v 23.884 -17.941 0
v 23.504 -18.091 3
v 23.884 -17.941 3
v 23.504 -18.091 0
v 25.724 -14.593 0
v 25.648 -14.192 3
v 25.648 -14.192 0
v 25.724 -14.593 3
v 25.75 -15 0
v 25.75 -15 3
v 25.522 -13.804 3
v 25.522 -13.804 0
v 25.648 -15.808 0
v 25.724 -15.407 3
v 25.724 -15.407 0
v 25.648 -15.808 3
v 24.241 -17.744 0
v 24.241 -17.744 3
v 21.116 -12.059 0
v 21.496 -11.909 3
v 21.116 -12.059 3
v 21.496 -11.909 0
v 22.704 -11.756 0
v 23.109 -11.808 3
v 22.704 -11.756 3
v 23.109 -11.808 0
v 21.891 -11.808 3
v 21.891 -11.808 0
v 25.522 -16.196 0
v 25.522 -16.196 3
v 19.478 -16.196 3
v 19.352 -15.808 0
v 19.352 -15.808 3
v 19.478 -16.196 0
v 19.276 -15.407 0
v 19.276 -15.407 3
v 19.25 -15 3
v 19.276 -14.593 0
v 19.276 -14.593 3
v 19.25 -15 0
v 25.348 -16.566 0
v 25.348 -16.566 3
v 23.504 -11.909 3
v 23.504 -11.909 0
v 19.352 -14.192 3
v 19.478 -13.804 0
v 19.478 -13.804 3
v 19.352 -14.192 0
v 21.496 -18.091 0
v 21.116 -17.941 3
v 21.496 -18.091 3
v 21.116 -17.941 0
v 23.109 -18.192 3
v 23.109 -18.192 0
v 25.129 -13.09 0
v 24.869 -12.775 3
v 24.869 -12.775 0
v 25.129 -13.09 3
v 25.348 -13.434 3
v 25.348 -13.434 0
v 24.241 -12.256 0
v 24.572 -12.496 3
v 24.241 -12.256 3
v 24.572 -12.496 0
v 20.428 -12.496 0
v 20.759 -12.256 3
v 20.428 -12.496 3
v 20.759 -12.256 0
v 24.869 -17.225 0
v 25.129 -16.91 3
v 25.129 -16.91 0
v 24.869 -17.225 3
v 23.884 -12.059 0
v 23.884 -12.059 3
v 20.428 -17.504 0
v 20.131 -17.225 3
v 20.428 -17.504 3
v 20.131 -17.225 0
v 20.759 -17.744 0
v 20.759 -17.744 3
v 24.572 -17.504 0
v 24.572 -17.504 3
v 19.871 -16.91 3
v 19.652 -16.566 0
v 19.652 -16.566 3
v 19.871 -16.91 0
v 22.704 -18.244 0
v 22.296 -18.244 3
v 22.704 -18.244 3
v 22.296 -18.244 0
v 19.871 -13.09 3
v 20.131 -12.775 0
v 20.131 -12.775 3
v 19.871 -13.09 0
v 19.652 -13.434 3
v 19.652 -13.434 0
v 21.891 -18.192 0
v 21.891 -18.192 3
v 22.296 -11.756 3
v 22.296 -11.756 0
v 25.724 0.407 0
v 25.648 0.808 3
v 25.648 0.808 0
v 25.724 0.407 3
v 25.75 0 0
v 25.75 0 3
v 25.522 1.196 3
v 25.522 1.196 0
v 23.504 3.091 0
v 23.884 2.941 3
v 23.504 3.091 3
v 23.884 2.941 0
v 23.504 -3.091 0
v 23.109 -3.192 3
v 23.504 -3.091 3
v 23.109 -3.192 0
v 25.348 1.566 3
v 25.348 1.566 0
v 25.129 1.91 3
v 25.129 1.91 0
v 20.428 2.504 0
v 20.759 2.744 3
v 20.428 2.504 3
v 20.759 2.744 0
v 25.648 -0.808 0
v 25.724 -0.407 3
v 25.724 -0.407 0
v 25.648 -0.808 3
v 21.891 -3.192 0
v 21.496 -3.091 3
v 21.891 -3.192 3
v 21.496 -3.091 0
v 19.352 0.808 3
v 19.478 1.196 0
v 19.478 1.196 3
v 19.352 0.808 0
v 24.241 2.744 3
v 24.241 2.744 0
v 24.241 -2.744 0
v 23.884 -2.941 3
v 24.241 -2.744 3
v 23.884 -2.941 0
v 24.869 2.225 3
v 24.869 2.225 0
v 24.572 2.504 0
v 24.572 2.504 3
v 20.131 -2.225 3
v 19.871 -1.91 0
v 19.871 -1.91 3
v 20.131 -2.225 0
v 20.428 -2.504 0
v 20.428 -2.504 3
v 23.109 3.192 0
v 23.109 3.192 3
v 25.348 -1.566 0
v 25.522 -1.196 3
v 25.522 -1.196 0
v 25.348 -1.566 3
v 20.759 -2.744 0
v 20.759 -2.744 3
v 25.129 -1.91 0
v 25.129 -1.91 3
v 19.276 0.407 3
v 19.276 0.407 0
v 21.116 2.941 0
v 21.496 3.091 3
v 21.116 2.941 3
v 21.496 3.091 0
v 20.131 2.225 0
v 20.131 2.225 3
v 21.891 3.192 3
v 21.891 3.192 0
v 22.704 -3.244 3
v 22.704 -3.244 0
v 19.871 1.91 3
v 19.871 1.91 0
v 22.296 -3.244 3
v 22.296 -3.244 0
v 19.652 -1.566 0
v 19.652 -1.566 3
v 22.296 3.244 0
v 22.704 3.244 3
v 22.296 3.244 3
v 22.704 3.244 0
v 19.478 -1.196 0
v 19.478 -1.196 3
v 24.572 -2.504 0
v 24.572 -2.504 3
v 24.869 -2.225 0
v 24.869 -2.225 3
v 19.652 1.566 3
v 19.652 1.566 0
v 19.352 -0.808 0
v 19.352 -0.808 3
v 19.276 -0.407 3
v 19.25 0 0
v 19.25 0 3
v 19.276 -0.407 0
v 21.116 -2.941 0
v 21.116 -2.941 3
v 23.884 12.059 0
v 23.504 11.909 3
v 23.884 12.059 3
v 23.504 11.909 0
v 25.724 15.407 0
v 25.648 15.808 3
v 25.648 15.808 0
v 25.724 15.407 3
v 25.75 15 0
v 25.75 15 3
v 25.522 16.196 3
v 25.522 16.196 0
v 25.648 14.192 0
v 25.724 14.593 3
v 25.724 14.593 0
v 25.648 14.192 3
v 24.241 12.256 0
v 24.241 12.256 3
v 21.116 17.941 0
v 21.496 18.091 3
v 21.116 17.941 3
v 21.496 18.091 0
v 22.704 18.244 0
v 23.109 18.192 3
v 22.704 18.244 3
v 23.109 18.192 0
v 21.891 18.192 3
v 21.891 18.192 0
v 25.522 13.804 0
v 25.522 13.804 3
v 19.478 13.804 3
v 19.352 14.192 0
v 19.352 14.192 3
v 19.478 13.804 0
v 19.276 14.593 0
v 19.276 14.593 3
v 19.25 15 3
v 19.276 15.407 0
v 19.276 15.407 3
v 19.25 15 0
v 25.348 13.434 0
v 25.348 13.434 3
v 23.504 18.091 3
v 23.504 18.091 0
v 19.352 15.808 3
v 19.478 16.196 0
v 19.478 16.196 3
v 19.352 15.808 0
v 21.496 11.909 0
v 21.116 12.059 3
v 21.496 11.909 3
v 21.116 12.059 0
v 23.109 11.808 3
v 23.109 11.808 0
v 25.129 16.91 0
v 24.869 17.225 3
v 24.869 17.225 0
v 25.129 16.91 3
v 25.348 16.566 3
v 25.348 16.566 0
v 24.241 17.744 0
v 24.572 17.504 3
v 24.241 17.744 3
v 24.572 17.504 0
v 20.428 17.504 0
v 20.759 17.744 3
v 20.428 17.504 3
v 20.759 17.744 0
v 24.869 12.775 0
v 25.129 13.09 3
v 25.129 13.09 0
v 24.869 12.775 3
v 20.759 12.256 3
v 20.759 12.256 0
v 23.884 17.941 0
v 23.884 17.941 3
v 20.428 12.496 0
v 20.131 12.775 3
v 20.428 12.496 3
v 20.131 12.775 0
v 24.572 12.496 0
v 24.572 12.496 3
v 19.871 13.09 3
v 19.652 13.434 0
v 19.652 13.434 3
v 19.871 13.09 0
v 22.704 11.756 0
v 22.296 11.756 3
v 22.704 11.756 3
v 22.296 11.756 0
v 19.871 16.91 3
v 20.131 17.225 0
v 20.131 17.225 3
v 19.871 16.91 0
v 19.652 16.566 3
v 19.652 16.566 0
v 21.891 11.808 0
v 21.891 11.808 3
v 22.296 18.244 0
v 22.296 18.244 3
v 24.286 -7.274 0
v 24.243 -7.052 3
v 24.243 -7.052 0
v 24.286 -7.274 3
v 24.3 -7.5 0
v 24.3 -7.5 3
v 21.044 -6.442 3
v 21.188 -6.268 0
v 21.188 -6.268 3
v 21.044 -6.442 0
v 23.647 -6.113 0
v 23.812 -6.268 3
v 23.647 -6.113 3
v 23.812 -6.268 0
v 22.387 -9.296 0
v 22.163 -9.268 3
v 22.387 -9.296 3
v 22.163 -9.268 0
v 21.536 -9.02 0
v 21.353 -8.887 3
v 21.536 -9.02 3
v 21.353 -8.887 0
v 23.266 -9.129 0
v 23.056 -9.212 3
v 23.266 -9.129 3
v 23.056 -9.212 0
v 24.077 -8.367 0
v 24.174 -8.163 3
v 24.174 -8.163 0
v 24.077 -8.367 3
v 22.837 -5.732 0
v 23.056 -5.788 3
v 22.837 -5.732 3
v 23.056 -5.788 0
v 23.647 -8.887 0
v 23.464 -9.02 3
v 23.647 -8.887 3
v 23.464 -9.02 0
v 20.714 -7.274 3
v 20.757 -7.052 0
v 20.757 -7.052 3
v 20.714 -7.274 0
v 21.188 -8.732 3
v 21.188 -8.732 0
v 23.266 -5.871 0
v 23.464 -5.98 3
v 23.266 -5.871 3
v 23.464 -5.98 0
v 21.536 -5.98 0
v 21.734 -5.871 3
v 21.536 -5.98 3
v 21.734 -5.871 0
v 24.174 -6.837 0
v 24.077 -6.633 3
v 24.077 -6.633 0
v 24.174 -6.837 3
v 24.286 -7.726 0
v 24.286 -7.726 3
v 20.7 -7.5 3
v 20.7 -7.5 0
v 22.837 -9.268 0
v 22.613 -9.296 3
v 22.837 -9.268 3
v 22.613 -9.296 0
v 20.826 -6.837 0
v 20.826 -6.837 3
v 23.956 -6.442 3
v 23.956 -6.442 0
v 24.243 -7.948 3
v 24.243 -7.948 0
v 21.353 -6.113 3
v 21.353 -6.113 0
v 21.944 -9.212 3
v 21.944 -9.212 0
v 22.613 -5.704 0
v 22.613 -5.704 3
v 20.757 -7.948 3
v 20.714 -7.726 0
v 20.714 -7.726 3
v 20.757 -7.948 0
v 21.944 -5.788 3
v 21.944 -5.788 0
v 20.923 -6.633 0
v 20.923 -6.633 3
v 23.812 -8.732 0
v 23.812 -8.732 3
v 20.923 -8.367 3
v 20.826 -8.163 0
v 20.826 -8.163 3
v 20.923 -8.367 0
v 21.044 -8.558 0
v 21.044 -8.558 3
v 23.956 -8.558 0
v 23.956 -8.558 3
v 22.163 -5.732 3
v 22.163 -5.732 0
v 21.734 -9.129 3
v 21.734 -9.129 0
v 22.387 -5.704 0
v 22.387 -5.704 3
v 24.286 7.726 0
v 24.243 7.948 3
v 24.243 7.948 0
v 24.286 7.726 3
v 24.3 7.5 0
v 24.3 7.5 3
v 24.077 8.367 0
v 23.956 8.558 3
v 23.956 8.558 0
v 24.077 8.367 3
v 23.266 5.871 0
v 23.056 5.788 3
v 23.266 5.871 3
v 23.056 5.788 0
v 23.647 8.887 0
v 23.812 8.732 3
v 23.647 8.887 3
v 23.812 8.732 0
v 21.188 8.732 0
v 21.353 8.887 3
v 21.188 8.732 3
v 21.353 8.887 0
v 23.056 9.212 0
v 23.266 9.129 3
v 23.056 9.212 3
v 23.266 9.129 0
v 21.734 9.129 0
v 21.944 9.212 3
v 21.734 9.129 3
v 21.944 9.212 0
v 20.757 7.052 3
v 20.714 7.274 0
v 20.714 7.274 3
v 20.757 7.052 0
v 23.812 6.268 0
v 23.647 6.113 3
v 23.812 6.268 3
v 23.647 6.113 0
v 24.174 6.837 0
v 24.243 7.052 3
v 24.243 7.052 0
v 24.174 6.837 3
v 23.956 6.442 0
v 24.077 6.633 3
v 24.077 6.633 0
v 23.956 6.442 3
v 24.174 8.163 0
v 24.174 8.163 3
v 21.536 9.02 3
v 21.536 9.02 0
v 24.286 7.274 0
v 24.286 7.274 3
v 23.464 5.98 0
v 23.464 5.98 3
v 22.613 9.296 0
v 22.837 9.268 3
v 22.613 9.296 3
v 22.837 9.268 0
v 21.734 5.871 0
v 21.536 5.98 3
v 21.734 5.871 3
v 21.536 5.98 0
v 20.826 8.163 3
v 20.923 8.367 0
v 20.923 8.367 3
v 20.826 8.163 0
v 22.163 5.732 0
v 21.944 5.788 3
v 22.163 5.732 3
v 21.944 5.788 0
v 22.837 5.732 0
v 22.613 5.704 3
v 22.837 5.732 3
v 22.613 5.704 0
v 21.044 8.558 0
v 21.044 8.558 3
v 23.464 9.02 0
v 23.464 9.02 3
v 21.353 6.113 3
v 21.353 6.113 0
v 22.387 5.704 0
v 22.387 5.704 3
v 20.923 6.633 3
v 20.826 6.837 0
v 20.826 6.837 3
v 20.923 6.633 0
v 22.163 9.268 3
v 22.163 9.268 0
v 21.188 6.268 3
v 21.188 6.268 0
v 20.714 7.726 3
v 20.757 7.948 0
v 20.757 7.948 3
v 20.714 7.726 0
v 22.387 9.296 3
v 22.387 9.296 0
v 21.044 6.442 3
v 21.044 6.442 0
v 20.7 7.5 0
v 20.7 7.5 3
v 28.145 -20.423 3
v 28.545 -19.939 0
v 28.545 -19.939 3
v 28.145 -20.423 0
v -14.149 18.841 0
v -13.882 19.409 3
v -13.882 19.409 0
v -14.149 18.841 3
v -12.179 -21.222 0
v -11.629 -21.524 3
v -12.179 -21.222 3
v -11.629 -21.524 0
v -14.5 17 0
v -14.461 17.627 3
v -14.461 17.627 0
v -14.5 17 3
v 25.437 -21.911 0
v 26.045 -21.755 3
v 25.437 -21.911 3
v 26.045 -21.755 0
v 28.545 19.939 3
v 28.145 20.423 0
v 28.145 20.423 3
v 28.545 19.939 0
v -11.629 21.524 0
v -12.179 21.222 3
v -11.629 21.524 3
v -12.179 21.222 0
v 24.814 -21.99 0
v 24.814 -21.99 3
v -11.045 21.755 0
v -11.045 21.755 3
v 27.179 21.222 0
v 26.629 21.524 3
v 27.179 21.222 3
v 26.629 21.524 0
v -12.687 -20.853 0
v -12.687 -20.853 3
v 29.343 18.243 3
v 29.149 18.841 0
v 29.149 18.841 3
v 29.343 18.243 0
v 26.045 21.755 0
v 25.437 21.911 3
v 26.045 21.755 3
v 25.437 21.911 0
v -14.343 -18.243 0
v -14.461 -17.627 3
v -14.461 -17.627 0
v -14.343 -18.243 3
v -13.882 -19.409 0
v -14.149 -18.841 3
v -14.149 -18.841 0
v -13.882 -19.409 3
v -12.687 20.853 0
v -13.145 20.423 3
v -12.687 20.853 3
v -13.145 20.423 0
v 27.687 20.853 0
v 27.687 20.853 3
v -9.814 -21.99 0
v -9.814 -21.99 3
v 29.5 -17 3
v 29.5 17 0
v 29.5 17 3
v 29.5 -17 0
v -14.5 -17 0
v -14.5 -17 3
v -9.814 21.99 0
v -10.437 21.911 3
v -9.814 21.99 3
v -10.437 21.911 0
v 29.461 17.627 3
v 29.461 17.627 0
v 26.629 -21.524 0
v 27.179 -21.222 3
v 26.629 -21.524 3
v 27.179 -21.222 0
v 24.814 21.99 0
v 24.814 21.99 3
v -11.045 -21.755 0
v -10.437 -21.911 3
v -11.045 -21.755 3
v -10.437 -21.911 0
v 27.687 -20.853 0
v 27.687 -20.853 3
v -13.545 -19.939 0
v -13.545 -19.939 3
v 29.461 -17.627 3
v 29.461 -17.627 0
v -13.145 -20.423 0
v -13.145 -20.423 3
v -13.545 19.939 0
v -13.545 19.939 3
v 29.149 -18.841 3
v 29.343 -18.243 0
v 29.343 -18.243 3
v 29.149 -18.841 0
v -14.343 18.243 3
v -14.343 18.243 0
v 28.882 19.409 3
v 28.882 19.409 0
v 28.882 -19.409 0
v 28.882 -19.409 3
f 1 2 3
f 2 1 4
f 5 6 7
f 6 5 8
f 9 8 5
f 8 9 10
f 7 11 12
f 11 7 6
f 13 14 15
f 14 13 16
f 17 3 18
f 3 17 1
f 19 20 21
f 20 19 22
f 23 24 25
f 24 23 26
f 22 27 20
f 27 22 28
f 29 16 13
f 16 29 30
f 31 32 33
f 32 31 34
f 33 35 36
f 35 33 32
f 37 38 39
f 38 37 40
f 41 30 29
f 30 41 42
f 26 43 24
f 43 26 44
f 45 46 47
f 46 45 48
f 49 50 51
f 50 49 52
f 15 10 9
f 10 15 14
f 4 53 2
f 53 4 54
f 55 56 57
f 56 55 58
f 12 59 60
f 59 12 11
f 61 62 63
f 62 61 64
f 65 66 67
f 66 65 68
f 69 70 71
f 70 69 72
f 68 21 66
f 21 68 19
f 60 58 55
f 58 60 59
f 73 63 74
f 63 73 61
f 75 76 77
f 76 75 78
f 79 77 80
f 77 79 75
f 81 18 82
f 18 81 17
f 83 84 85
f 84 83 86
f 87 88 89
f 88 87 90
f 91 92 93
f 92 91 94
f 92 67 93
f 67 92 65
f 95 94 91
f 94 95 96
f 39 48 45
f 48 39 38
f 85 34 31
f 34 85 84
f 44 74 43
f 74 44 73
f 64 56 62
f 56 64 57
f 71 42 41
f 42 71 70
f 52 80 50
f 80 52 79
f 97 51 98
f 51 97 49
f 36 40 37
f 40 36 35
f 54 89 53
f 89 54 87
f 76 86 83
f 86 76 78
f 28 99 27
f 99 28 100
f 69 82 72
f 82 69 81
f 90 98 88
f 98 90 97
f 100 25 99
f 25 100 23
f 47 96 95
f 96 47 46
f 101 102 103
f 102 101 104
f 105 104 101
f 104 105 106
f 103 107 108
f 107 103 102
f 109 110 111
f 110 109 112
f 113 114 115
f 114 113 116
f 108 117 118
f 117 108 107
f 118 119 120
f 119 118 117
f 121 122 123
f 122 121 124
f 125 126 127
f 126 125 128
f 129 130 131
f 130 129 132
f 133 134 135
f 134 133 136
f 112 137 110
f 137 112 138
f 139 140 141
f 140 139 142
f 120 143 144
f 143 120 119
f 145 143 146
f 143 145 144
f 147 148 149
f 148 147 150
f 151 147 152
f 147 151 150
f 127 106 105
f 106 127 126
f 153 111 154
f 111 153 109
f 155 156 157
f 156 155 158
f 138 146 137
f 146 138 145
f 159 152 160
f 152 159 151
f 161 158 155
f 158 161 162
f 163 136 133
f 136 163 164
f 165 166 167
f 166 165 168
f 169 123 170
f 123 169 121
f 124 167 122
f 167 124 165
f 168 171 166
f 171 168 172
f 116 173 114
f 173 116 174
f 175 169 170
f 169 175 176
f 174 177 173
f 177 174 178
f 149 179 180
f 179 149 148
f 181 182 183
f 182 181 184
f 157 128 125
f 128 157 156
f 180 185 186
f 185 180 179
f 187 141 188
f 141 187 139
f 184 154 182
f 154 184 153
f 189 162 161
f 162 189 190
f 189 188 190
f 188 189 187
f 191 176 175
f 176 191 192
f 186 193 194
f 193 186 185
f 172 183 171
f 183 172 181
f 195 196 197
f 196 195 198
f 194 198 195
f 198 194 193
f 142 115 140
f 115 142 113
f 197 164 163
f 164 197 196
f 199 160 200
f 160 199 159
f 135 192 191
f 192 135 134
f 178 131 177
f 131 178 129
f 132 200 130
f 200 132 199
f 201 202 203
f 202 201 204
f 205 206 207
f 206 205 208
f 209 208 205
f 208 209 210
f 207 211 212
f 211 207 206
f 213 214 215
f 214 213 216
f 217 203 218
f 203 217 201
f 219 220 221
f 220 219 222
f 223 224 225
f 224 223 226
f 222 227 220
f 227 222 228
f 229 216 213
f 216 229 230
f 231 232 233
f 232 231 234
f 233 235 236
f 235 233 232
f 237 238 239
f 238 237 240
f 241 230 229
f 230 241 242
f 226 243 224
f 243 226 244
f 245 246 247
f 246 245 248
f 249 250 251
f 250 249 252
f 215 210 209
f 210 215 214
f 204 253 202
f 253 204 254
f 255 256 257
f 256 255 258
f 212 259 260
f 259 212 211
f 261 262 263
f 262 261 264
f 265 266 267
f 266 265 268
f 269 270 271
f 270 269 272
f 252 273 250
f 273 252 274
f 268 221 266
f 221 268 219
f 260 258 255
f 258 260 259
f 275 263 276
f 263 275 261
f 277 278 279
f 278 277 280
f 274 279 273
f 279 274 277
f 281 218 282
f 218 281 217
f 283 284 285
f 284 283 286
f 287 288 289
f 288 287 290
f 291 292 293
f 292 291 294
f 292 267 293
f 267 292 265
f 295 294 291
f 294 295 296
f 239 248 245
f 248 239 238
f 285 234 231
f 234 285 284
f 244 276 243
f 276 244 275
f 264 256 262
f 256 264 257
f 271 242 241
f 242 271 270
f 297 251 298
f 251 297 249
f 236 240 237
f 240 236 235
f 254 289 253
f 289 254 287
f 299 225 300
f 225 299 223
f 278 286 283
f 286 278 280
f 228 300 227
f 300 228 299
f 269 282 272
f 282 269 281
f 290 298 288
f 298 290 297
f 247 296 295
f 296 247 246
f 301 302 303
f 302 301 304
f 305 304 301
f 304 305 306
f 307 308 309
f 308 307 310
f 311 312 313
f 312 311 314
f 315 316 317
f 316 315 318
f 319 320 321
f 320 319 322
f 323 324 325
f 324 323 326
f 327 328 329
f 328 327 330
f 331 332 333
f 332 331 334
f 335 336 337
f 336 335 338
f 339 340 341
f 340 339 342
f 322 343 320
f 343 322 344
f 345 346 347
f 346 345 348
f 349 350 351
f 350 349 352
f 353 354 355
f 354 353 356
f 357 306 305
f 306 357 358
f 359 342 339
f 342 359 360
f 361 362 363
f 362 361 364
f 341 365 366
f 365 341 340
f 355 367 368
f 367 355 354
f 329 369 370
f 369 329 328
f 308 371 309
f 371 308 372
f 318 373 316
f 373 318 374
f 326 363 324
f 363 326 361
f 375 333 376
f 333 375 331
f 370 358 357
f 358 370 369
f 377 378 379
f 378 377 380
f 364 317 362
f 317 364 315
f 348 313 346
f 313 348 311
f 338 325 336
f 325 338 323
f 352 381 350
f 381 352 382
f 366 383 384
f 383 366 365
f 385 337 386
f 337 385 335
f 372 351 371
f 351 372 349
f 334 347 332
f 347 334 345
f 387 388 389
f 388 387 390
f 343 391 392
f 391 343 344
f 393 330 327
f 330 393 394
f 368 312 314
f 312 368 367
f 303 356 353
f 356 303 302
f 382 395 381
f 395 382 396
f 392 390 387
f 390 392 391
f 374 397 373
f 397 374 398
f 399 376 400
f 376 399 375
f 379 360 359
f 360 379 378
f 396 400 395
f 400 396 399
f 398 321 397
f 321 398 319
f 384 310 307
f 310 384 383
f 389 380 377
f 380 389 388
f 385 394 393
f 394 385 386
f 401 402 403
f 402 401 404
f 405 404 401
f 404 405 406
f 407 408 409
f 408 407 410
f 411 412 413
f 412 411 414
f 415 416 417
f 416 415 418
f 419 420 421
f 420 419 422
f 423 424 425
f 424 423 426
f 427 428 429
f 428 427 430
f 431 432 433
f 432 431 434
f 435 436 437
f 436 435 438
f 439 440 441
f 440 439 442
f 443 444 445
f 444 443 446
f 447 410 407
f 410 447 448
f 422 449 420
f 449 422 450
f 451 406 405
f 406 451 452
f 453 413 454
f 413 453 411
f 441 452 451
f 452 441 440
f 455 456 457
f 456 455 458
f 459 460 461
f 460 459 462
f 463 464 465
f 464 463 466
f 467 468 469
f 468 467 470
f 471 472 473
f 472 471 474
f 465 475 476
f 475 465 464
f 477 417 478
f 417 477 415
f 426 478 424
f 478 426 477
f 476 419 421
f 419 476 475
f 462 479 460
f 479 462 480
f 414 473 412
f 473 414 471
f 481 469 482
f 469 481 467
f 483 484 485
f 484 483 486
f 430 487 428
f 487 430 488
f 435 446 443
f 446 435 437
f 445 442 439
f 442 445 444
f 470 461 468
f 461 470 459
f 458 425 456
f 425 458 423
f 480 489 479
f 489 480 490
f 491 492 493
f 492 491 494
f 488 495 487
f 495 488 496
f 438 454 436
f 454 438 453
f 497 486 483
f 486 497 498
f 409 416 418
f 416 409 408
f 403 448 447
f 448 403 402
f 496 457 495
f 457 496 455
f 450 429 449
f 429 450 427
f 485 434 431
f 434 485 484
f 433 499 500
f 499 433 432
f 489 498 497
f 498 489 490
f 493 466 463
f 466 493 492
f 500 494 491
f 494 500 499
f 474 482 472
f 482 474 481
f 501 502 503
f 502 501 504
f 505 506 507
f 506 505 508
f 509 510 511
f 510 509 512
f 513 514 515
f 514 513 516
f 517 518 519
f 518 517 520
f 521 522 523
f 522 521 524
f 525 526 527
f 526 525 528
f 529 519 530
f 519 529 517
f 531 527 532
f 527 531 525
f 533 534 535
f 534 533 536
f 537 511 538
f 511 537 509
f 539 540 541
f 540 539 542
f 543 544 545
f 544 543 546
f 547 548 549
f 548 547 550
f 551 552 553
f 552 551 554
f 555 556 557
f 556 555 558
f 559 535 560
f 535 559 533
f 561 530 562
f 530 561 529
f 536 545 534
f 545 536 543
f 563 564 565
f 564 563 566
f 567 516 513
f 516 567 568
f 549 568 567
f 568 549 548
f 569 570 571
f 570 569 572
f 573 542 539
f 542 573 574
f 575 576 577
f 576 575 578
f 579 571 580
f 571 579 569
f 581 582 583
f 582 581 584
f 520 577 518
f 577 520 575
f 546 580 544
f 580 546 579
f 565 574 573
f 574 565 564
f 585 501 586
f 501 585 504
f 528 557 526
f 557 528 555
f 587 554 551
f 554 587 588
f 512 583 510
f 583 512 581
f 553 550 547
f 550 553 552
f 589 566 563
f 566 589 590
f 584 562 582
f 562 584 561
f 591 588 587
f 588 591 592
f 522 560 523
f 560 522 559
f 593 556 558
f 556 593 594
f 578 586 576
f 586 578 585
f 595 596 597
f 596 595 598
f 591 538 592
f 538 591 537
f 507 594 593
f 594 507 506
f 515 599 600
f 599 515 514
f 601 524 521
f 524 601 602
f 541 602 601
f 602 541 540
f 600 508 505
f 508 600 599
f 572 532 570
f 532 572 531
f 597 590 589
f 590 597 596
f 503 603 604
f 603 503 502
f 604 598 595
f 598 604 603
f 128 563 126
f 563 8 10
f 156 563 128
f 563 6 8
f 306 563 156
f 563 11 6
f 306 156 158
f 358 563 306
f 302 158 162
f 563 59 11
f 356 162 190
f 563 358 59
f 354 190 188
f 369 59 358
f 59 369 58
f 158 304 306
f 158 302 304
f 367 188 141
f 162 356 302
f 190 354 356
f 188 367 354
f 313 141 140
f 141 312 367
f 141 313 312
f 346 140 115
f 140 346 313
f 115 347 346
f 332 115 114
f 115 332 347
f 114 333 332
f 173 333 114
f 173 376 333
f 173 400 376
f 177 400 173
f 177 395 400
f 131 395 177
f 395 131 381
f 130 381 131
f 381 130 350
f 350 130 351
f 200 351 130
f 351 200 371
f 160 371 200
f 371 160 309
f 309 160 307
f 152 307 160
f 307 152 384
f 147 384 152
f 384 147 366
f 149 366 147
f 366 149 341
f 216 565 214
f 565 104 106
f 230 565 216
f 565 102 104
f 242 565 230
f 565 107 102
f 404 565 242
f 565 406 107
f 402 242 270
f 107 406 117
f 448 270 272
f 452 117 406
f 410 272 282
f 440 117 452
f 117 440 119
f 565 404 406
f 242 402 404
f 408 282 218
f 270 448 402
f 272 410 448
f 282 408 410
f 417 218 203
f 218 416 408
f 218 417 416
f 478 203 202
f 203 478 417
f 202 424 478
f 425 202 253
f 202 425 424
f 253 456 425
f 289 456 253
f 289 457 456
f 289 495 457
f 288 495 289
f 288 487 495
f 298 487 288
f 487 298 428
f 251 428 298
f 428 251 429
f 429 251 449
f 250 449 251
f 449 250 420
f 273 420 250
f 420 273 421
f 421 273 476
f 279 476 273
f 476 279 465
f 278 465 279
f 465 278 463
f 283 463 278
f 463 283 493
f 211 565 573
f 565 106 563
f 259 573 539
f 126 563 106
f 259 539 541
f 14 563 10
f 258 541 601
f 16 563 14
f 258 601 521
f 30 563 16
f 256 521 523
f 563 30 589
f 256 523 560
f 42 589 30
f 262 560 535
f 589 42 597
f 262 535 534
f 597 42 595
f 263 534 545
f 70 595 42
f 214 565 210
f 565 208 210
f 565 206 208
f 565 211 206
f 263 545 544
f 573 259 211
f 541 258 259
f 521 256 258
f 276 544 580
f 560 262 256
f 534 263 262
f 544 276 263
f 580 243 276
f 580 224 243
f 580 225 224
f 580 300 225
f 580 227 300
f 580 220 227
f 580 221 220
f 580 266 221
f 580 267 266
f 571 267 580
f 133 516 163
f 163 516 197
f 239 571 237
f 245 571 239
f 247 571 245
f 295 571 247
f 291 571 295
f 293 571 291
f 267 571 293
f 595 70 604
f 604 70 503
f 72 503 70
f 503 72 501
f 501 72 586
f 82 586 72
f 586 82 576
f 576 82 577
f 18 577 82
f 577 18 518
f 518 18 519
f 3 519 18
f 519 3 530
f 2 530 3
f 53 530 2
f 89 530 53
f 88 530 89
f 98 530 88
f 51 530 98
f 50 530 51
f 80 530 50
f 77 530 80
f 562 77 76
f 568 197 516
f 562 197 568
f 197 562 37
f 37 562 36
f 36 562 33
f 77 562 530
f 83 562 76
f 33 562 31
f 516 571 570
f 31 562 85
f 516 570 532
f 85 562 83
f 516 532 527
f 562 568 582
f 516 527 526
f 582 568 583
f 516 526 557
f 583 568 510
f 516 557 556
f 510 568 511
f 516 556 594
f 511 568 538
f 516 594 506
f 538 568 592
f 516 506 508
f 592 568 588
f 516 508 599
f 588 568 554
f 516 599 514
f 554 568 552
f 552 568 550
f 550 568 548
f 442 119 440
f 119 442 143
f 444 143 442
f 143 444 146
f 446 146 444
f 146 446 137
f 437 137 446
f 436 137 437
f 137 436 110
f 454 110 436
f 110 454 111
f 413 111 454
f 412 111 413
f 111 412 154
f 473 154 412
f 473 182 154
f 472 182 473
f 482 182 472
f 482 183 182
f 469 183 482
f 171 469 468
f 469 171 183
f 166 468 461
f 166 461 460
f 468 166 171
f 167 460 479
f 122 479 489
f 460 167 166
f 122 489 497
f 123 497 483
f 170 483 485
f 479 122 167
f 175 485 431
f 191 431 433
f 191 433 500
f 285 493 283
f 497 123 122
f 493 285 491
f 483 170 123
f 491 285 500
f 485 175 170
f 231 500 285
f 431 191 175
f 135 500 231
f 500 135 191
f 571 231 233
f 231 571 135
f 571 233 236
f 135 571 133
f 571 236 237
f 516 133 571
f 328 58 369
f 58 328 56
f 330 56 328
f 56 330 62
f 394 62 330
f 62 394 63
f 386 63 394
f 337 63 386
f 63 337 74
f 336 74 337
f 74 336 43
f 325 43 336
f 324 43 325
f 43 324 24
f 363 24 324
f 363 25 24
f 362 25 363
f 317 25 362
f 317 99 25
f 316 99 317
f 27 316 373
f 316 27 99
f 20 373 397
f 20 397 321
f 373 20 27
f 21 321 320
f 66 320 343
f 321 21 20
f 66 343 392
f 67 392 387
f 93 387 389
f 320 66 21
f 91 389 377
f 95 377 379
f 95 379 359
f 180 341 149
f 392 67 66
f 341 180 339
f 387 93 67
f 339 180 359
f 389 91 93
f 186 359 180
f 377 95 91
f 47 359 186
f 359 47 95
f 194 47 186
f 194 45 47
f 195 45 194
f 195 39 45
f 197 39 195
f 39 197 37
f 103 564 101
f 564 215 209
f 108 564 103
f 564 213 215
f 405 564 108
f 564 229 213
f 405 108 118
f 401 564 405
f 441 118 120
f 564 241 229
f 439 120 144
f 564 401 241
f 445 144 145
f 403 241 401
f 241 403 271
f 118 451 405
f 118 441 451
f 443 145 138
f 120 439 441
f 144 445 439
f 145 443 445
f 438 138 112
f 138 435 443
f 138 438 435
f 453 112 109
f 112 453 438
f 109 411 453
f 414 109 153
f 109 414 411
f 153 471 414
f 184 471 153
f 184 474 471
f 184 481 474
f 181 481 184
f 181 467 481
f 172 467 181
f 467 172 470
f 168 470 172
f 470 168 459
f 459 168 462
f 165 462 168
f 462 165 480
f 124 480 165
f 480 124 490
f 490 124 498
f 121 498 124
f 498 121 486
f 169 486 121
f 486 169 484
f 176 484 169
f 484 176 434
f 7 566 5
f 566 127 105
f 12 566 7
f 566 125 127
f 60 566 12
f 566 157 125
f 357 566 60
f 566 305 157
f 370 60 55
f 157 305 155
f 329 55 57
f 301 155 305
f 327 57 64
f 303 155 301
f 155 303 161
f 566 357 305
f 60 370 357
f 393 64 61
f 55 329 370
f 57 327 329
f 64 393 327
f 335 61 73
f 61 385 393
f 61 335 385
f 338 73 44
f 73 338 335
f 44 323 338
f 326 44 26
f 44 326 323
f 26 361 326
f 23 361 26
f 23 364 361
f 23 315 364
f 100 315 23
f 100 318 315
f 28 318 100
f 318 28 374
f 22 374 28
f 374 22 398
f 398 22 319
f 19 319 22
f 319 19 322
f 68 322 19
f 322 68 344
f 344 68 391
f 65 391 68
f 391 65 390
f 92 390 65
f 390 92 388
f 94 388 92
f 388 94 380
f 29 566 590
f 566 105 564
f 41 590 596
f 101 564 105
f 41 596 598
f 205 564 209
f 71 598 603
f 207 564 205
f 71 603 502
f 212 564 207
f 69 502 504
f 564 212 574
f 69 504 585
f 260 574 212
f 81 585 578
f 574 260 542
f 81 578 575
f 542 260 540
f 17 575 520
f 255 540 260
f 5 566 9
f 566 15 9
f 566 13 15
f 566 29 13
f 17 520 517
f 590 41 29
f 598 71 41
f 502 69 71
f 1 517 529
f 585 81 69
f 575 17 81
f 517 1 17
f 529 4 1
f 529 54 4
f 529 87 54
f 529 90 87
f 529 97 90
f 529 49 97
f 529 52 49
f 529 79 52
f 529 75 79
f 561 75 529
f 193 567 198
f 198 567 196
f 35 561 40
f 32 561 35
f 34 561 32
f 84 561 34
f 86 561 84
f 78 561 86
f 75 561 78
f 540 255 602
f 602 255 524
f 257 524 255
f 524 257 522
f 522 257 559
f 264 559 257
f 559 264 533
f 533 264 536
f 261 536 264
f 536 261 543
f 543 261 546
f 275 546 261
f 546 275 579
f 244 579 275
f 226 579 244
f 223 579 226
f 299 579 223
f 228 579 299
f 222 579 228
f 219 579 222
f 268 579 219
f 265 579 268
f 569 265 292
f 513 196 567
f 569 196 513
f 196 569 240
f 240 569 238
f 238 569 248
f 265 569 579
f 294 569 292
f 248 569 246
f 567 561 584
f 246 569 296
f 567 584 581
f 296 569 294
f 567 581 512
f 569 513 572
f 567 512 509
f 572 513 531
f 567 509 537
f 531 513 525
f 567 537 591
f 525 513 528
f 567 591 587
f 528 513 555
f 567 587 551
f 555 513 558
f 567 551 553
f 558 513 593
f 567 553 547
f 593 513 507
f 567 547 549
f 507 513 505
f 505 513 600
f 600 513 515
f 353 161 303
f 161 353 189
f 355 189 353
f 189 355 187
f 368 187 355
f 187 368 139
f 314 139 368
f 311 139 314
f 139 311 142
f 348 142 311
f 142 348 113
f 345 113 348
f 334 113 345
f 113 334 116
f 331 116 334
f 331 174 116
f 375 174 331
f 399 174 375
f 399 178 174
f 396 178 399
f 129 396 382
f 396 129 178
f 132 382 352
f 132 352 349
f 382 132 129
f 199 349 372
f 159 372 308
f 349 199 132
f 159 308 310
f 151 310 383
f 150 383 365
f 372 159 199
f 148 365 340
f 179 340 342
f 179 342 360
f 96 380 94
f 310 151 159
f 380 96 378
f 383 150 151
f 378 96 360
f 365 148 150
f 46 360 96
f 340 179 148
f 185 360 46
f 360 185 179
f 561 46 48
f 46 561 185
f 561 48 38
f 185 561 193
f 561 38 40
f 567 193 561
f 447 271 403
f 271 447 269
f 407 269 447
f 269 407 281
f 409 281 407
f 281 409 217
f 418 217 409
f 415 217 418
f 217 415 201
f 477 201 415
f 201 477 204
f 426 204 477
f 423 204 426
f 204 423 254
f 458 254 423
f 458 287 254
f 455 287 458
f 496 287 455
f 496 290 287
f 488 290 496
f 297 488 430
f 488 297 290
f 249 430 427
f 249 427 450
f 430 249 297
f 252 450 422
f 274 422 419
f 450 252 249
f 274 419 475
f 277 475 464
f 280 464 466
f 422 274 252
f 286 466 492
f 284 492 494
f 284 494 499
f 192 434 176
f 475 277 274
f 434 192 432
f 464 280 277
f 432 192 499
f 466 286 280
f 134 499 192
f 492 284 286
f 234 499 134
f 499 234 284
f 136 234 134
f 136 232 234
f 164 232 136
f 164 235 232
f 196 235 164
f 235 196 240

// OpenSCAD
$fn = 50;

difference() {
	union() {
		translate(v = [7.5, 0.0, 0]) {
			hull() {
				translate(v = [-17.0, 17.0, 0]) {
					cylinder(h = 3, r = 5);
				}
				translate(v = [17.0, 17.0, 0]) {
					cylinder(h = 3, r = 5);
				}
				translate(v = [-17.0, -17.0, 0]) {
					cylinder(h = 3, r = 5);
				}
				translate(v = [17.0, -17.0, 0]) {
					cylinder(h = 3, r = 5);
				}
			}
		}
	}
	union() {
		translate(v = [22.5, -15.0, -1]) {
			cylinder(h = 5, r = 3.25);
		}
		translate(v = [22.5, 0.0, -1]) {
			cylinder(h = 5, r = 3.25);
		}
		translate(v = [22.5, 15.0, -1]) {
			cylinder(h = 5, r = 3.25);
		}
		translate(v = [22.5, -7.5, -1]) {
			cylinder(h = 5, r = 1.8);
		}
		translate(v = [22.5, 7.5, -1]) {
			cylinder(h = 5, r = 1.8);
		}
	}
}
